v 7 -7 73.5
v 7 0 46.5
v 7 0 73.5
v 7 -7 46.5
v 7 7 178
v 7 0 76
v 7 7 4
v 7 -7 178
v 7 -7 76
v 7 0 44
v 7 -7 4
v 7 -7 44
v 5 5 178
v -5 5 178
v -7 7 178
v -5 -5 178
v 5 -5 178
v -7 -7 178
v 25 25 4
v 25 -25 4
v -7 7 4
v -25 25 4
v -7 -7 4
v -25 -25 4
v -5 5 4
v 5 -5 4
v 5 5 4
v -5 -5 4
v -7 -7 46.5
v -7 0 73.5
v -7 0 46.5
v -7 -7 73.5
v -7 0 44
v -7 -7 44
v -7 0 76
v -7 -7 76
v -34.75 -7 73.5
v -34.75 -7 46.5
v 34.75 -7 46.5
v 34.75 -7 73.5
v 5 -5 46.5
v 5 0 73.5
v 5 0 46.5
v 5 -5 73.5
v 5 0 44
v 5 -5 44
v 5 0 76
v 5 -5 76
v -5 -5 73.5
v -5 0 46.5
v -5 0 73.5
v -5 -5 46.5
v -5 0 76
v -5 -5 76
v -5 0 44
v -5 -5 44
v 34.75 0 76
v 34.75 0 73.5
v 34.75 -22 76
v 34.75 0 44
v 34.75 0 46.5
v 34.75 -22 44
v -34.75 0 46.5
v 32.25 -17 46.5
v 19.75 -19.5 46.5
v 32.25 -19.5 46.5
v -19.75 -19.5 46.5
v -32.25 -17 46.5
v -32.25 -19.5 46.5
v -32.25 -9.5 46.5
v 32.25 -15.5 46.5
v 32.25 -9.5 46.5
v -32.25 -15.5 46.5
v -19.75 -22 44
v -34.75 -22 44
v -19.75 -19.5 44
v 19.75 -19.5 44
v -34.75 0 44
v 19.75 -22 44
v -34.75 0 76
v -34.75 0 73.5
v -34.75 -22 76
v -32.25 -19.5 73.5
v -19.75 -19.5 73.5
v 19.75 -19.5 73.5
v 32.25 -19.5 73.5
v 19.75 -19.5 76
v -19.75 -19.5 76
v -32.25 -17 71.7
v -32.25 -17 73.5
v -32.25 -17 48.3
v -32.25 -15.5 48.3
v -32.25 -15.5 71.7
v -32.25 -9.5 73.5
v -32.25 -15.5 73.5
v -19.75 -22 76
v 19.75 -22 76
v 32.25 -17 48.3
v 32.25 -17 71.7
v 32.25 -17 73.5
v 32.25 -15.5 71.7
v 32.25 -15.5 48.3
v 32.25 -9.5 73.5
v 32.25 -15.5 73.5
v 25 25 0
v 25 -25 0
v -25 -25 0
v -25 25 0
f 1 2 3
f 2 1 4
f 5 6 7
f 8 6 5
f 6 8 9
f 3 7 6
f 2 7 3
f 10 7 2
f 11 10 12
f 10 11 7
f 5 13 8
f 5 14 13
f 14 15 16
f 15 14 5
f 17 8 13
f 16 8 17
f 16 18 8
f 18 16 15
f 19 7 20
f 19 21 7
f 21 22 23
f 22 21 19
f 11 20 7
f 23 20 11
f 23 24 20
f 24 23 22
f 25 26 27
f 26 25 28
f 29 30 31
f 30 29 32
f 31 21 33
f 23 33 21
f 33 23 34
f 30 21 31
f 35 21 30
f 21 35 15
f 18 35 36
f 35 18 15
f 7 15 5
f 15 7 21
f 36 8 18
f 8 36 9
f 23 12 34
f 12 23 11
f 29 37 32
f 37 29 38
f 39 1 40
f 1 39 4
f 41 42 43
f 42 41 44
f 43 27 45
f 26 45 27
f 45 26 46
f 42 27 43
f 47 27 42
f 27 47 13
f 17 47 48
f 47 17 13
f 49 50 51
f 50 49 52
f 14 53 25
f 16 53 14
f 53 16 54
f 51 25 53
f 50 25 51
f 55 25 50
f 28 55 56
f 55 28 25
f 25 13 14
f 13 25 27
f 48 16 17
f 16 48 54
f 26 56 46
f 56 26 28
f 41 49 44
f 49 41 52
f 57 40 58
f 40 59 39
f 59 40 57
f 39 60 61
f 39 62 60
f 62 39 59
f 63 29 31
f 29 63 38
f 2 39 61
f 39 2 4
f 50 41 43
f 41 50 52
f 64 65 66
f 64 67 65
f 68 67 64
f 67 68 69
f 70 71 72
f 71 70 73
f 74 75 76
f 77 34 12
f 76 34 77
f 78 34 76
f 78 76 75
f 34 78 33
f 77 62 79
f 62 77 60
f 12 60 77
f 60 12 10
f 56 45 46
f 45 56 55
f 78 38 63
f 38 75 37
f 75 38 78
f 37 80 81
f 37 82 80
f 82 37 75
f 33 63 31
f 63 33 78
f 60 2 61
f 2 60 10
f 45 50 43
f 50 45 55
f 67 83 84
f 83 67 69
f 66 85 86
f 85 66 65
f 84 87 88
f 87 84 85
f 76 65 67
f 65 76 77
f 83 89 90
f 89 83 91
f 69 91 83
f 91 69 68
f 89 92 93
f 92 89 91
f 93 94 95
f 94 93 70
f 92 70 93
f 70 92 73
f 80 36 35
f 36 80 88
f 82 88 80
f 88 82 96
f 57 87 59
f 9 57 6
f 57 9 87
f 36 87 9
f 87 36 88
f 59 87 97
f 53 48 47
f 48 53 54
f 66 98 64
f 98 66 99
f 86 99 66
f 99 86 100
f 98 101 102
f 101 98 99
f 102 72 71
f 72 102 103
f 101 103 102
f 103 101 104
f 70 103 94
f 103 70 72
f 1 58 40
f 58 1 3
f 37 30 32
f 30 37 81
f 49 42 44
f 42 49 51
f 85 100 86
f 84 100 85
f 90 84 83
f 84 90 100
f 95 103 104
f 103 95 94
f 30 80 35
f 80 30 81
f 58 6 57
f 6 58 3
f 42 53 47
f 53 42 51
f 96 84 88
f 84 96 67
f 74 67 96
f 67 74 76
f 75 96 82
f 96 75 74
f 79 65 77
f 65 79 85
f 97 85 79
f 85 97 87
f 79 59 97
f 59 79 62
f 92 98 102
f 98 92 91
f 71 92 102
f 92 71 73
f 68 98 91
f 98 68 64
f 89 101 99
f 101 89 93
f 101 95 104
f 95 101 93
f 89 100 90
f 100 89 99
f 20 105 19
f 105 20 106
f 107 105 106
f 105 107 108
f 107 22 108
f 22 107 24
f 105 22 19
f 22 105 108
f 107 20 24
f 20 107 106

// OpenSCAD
/*
 * ESP32-S3 Mounting Stand — Matches Reference Photo
 * ===================================================
 * - Total height: 178mm (17.8cm)
 * - Base: 50×50×4mm
 * - Hollow square rod (saves material)  
 * - ESP32 bracket at 60mm from base (6cm)
 * - Rod continues above ESP32 to top
 * - ESP32-S3-DevKitC-1: 62.74mm × 25.40mm
 *
 * OpenSCAD: F5=preview, F6=render, Export as STL
 */

// === DIMENSIONS (all in mm) ===
total_height = 178;
base_w = 50;
base_d = 50;
base_h = 4;

// Rod (hollow square tube)
rod_outer = 14;        // 14mm square rod
rod_wall = 2;          // 2mm wall → 10mm hollow core
rod_inner = rod_outer - 2*rod_wall;

// ESP32 bracket position
bracket_center_z = 60; // ESP32 center at 6cm from base bottom

// ESP32-S3-DevKitC-1 with print tolerance
pcb_length = 64.5;    // 62.74 + 1.76mm tolerance
pcb_width = 27;        // 25.40 + 1.6mm tolerance
pcb_thick = 1.8;       // PCB thickness
board_thick = 10;      // Total thickness with components below

// Bracket walls
bwall = 2.5;           // Bracket wall thickness

// === COMPUTED ===
bracket_h = pcb_width + 2*bwall;  // ~32mm tall
bracket_z = bracket_center_z - bracket_h/2;  // Z start of bracket

// === BASE PLATE ===
module base() {
    // Simple flat base
    translate([-base_w/2, -base_d/2, 0])
        cube([base_w, base_d, base_h]);
}

// === HOLLOW SQUARE ROD ===
module hollow_rod() {
    rod_h = total_height - base_h;
    translate([0, 0, base_h]) {
        difference() {
            // Outer square
            translate([-rod_outer/2, -rod_outer/2, 0])
                cube([rod_outer, rod_outer, rod_h]);
            // Inner hollow
            translate([-rod_inner/2, -rod_inner/2, -0.1])
                cube([rod_inner, rod_inner, rod_h + 0.2]);
        }
    }
}

// === ESP32 BRACKET (C-shaped cradle) ===
module esp32_bracket() {
    /*
     * Side view (looking from left):
     *        ┌─────────────┐ ← top wall
     *        │  ESP32 PCB  │
     *        │  sits here  │
     *        │             │
     * ROD ──►│             │◄── open front (antenna)
     *        │             │
     *        └─────────────┘ ← bottom shelf
     *
     * The bracket extends from the rod toward the phantom.
     * Front is OPEN so antenna radiates toward phantom.
     */
    
    bracket_w = pcb_length + 2*bwall;  // total width ~69.5mm
    bracket_d = board_thick + bwall;   // depth from rod face ~12.5mm
    
    translate([0, 0, bracket_z]) {
        // Bottom shelf (ESP32 rests on this)
        translate([-bracket_w/2, -rod_outer/2 - bracket_d, 0])
            cube([bracket_w, bracket_d + rod_outer/2, bwall]);
        
        // Left side wall
        translate([-bracket_w/2, -rod_outer/2 - bracket_d, 0])
            cube([bwall, bracket_d, bracket_h]);
        
        // Right side wall
        translate([bracket_w/2 - bwall, -rod_outer/2 - bracket_d, 0])
            cube([bwall, bracket_d, bracket_h]);
        
        // Back wall (connects to rod, small reinforcement)
        translate([-bracket_w/2, -rod_outer/2 - bwall, 0])
            cube([bracket_w, bwall, bracket_h]);
        
        // Top wall (holds ESP32 from above)
        translate([-bracket_w/2, -rod_outer/2 - bracket_d, bracket_h - bwall])
            cube([bracket_w, bracket_d + rod_outer/2, bwall]);
        
        // Front lip (small, leaves antenna area open)
        // Left lip
        translate([-bracket_w/2, -rod_outer/2 - bracket_d - bwall, 0])
            cube([15, bwall, bracket_h]);
        // Right lip  
        translate([bracket_w/2 - 15, -rod_outer/2 - bracket_d - bwall, 0])
            cube([15, bwall, bracket_h]);
        
        // PCB guide rails (two thin rails for PCB to slide into)
        // Bottom rail (PCB rests on these)
        translate([-pcb_length/2, -rod_outer/2 - bracket_d + bwall, bwall])
            cube([pcb_length, 1.5, pcb_thick]);
        // Top rail (holds PCB from above)
        translate([-pcb_length/2, -rod_outer/2 - bracket_d + bwall, bracket_h - bwall - pcb_thick])
            cube([pcb_length, 1.5, pcb_thick]);
    }
}

// === USB CABLE CHANNEL ===
module usb_channel() {
    // Small channel through the bracket for USB cable
    translate([-5, -rod_outer/2 - 15, bracket_z + bwall + 2])
        cube([10, 5, 12]);
}

// === COMPLETE STAND ===
module esp32_stand() {
    difference() {
        union() {
            base();
            hollow_rod();
            esp32_bracket();
        }
        usb_channel();
    }
}

// === RENDER ===
color("LightGray")
    esp32_stand();

// === DEBUG INFO ===
echo(str("Total height: ", total_height, " mm"));
echo(str("Base: ", base_w, "×", base_d, "×", base_h, " mm"));
echo(str("Rod: ", rod_outer, "mm square, ", rod_wall, "mm wall (hollow)"));
echo(str("ESP32 bracket center at Z=", bracket_center_z, " mm (", bracket_center_z/10, " cm)"));
echo(str("Bracket size: ", pcb_length + 2*bwall, "×", bracket_h, " mm"));
